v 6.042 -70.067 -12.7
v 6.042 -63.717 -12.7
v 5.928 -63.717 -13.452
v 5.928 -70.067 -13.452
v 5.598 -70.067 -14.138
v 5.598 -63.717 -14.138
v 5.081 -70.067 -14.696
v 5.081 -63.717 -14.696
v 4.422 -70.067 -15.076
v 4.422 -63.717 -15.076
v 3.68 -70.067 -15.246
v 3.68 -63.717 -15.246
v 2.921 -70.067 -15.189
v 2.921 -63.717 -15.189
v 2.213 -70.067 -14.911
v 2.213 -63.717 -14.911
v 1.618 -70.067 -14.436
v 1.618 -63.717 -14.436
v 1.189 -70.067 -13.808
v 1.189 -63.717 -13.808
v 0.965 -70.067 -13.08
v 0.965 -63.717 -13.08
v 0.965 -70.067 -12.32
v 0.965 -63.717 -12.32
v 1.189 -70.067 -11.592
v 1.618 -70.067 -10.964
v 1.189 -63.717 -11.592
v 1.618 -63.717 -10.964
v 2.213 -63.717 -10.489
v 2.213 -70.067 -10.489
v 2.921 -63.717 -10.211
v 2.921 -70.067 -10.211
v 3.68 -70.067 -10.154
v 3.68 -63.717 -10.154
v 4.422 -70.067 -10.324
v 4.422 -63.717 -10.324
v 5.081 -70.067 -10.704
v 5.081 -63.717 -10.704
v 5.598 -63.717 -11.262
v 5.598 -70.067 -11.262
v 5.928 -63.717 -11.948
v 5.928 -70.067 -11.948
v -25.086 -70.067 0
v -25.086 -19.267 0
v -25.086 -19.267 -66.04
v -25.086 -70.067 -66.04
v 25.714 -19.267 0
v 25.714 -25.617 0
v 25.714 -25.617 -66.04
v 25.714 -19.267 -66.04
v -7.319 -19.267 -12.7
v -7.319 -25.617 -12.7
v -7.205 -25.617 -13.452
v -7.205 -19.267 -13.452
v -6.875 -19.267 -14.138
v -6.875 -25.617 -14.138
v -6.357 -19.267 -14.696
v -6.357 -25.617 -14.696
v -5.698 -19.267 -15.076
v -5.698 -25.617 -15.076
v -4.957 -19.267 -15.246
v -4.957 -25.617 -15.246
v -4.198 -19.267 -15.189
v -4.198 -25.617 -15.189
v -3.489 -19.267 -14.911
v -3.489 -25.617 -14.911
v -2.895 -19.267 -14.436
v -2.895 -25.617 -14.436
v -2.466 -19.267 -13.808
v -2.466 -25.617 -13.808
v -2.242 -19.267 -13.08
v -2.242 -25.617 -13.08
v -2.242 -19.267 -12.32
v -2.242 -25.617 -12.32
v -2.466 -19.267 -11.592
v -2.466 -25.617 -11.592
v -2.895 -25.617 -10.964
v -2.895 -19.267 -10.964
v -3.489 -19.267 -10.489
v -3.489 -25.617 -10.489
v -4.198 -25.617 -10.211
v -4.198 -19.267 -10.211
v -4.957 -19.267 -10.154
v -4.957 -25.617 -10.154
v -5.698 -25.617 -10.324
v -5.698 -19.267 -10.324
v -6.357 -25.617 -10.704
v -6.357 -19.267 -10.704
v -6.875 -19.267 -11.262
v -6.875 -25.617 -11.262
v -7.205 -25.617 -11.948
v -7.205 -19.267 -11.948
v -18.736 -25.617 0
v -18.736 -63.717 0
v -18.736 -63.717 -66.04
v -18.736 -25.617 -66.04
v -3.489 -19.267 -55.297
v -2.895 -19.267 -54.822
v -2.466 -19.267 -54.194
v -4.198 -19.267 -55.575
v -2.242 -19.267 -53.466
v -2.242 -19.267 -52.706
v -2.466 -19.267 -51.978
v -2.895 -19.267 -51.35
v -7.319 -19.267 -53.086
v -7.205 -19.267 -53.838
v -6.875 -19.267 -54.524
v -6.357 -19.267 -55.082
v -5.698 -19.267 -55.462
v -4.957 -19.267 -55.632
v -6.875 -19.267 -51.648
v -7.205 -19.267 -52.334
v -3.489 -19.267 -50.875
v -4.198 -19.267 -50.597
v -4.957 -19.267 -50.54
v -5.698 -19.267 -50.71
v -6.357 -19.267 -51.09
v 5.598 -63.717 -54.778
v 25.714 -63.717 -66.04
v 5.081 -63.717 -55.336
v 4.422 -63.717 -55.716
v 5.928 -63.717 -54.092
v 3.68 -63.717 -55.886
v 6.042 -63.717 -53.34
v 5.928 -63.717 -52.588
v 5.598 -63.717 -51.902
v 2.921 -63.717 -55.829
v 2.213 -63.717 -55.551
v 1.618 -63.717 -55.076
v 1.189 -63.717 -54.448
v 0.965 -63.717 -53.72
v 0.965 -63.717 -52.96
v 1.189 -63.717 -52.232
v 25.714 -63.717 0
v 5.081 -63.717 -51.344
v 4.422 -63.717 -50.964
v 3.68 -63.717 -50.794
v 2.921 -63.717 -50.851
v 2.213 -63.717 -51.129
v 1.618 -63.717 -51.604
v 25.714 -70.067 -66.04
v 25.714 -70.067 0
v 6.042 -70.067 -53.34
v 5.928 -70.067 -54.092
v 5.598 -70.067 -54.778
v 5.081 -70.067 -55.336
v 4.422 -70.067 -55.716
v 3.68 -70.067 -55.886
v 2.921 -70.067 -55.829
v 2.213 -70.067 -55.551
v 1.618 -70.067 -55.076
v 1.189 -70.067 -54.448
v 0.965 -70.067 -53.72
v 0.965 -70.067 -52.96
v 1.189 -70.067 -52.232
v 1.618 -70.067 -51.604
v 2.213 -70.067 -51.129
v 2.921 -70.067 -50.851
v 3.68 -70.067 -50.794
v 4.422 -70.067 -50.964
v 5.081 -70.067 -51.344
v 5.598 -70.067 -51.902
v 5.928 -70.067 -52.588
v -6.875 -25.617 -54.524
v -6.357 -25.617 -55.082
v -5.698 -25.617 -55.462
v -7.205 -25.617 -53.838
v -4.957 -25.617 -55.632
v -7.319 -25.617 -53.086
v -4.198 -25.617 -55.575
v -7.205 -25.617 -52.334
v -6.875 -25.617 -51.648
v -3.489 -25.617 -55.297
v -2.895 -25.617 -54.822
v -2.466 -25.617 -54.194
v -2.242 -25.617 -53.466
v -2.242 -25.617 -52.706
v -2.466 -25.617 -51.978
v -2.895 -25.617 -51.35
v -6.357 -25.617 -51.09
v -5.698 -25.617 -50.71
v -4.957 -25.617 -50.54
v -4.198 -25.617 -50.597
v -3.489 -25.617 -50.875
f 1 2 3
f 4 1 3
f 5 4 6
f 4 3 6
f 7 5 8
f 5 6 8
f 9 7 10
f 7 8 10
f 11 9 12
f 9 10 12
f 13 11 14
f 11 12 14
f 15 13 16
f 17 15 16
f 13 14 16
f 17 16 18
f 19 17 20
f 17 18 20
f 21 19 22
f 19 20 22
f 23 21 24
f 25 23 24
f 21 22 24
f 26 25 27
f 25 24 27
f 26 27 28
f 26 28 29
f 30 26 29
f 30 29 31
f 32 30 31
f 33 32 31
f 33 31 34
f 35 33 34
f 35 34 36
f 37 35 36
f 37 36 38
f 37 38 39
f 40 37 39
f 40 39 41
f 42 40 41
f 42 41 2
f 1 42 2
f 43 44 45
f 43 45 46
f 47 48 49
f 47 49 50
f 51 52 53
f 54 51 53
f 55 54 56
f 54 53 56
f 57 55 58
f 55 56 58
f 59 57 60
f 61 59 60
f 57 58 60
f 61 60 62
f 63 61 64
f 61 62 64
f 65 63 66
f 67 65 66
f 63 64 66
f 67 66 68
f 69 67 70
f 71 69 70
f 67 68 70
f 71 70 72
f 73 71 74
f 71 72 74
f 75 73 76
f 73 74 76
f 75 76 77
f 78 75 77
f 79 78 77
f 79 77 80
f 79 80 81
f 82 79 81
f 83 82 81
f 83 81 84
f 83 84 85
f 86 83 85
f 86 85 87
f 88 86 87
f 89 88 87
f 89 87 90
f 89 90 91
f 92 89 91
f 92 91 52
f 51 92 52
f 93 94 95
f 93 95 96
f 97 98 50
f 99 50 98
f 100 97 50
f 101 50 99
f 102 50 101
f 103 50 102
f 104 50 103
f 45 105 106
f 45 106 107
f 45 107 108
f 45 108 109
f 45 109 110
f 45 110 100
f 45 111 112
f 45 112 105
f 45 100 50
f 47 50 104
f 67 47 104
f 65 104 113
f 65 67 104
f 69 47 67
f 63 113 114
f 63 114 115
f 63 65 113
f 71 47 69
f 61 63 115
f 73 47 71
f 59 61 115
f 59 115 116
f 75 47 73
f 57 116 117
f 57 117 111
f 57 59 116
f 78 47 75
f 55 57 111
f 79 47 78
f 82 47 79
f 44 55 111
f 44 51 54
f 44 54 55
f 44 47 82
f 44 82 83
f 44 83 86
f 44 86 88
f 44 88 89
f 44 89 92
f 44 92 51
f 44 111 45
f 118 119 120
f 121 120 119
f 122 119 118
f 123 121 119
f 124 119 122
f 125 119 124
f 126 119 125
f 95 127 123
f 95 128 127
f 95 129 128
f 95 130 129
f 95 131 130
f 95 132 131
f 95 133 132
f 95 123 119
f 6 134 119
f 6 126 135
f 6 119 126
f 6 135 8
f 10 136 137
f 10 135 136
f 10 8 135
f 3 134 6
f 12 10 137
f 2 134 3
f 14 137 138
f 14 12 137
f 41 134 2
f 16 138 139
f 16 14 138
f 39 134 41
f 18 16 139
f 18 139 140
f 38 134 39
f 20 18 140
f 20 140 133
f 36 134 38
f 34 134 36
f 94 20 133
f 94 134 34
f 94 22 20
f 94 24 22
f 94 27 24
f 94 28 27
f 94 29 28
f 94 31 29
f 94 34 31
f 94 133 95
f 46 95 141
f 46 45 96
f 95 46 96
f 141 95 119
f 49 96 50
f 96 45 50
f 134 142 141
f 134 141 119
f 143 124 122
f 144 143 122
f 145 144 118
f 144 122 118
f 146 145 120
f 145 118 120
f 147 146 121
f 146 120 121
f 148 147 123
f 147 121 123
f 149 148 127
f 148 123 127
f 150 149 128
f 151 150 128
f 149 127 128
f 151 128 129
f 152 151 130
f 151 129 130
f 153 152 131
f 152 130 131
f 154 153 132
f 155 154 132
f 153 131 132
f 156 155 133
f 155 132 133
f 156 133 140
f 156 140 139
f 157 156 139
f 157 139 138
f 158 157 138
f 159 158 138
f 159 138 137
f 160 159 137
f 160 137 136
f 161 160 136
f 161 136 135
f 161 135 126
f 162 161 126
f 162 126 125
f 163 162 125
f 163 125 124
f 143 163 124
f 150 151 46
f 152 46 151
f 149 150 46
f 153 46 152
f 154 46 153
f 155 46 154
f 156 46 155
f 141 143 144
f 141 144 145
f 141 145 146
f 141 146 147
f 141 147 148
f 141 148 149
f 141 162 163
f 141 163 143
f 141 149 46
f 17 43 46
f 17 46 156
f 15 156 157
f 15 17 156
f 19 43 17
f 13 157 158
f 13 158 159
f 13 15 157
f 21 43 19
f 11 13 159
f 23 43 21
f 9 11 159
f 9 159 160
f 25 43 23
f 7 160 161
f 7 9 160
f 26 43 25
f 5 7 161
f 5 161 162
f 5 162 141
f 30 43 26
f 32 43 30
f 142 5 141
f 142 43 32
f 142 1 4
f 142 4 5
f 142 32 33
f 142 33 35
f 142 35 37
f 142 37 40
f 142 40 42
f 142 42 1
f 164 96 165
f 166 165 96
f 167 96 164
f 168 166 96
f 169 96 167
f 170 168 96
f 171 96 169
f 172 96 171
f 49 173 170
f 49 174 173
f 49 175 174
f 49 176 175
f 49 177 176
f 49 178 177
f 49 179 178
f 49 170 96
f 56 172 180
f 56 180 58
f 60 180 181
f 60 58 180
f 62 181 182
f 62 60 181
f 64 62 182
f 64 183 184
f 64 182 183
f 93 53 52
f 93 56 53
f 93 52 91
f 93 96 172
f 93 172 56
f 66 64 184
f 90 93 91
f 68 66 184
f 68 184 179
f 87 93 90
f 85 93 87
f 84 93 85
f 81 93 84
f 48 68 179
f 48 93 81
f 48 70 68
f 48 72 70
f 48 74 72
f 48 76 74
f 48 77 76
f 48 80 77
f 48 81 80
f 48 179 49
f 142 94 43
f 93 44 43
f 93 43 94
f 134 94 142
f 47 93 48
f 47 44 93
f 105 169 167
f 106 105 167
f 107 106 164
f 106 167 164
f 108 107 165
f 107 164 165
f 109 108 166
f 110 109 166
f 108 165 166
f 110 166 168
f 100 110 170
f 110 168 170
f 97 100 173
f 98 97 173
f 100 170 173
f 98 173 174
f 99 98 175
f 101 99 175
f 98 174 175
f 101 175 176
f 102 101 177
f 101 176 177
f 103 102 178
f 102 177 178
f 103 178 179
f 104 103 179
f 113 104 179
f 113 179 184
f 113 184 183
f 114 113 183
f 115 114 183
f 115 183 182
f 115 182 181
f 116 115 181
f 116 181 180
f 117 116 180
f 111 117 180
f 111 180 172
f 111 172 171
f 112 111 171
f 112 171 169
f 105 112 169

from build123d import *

# Parameters (mm, degrees)
BOSS_EXTRUDE1_DEPTH         = 66.04
F_1_4_20_TAPPED_HOLE1_D     = 5.1054
F_1_4_20_TAPPED_HOLE1_DEPTH = 6.35
F_1_4_20_TAPPED_HOLE2_D     = 5.1054
F_1_4_20_TAPPED_HOLE2_DEPTH = 6.35


with BuildPart() as part:
    # Sketch1 → Boss-Extrude1 (new body)
    with BuildSketch(Plane.XY):
        Polygon((-18.735809365, -25.616936059), (25.714190635, -25.616936059), (25.714190635, -19.266936059), (-25.085809365, -19.266936059), (-25.085809365, -70.066936059), (25.714190635, -70.066936059), (25.714190635, -63.716936059), (-18.735809365, -63.716936059), align=None)
    extrude(amount=-BOSS_EXTRUDE1_DEPTH)

    # 1/4-20 Tapped Hole1
    with Locations(Plane(origin=(0, -19.266936059, 0), x_dir=(1, 0, 0), z_dir=(0, 1, 0))):
        with Locations((-4.765809365, 53.086), (-4.765809365, 12.7)):
            Hole(F_1_4_20_TAPPED_HOLE1_D / 2, depth=F_1_4_20_TAPPED_HOLE1_DEPTH)

    # 1/4-20 Tapped Hole2
    with Locations(Plane(origin=(0, -70.066936059, 0), x_dir=(-1, 0, 0), z_dir=(0, -1, 0))):
        with Locations((-3.489190635, 12.7), (-3.489190635, 53.34)):
            Hole(F_1_4_20_TAPPED_HOLE2_D / 2, depth=F_1_4_20_TAPPED_HOLE2_DEPTH)


solid = part.part
